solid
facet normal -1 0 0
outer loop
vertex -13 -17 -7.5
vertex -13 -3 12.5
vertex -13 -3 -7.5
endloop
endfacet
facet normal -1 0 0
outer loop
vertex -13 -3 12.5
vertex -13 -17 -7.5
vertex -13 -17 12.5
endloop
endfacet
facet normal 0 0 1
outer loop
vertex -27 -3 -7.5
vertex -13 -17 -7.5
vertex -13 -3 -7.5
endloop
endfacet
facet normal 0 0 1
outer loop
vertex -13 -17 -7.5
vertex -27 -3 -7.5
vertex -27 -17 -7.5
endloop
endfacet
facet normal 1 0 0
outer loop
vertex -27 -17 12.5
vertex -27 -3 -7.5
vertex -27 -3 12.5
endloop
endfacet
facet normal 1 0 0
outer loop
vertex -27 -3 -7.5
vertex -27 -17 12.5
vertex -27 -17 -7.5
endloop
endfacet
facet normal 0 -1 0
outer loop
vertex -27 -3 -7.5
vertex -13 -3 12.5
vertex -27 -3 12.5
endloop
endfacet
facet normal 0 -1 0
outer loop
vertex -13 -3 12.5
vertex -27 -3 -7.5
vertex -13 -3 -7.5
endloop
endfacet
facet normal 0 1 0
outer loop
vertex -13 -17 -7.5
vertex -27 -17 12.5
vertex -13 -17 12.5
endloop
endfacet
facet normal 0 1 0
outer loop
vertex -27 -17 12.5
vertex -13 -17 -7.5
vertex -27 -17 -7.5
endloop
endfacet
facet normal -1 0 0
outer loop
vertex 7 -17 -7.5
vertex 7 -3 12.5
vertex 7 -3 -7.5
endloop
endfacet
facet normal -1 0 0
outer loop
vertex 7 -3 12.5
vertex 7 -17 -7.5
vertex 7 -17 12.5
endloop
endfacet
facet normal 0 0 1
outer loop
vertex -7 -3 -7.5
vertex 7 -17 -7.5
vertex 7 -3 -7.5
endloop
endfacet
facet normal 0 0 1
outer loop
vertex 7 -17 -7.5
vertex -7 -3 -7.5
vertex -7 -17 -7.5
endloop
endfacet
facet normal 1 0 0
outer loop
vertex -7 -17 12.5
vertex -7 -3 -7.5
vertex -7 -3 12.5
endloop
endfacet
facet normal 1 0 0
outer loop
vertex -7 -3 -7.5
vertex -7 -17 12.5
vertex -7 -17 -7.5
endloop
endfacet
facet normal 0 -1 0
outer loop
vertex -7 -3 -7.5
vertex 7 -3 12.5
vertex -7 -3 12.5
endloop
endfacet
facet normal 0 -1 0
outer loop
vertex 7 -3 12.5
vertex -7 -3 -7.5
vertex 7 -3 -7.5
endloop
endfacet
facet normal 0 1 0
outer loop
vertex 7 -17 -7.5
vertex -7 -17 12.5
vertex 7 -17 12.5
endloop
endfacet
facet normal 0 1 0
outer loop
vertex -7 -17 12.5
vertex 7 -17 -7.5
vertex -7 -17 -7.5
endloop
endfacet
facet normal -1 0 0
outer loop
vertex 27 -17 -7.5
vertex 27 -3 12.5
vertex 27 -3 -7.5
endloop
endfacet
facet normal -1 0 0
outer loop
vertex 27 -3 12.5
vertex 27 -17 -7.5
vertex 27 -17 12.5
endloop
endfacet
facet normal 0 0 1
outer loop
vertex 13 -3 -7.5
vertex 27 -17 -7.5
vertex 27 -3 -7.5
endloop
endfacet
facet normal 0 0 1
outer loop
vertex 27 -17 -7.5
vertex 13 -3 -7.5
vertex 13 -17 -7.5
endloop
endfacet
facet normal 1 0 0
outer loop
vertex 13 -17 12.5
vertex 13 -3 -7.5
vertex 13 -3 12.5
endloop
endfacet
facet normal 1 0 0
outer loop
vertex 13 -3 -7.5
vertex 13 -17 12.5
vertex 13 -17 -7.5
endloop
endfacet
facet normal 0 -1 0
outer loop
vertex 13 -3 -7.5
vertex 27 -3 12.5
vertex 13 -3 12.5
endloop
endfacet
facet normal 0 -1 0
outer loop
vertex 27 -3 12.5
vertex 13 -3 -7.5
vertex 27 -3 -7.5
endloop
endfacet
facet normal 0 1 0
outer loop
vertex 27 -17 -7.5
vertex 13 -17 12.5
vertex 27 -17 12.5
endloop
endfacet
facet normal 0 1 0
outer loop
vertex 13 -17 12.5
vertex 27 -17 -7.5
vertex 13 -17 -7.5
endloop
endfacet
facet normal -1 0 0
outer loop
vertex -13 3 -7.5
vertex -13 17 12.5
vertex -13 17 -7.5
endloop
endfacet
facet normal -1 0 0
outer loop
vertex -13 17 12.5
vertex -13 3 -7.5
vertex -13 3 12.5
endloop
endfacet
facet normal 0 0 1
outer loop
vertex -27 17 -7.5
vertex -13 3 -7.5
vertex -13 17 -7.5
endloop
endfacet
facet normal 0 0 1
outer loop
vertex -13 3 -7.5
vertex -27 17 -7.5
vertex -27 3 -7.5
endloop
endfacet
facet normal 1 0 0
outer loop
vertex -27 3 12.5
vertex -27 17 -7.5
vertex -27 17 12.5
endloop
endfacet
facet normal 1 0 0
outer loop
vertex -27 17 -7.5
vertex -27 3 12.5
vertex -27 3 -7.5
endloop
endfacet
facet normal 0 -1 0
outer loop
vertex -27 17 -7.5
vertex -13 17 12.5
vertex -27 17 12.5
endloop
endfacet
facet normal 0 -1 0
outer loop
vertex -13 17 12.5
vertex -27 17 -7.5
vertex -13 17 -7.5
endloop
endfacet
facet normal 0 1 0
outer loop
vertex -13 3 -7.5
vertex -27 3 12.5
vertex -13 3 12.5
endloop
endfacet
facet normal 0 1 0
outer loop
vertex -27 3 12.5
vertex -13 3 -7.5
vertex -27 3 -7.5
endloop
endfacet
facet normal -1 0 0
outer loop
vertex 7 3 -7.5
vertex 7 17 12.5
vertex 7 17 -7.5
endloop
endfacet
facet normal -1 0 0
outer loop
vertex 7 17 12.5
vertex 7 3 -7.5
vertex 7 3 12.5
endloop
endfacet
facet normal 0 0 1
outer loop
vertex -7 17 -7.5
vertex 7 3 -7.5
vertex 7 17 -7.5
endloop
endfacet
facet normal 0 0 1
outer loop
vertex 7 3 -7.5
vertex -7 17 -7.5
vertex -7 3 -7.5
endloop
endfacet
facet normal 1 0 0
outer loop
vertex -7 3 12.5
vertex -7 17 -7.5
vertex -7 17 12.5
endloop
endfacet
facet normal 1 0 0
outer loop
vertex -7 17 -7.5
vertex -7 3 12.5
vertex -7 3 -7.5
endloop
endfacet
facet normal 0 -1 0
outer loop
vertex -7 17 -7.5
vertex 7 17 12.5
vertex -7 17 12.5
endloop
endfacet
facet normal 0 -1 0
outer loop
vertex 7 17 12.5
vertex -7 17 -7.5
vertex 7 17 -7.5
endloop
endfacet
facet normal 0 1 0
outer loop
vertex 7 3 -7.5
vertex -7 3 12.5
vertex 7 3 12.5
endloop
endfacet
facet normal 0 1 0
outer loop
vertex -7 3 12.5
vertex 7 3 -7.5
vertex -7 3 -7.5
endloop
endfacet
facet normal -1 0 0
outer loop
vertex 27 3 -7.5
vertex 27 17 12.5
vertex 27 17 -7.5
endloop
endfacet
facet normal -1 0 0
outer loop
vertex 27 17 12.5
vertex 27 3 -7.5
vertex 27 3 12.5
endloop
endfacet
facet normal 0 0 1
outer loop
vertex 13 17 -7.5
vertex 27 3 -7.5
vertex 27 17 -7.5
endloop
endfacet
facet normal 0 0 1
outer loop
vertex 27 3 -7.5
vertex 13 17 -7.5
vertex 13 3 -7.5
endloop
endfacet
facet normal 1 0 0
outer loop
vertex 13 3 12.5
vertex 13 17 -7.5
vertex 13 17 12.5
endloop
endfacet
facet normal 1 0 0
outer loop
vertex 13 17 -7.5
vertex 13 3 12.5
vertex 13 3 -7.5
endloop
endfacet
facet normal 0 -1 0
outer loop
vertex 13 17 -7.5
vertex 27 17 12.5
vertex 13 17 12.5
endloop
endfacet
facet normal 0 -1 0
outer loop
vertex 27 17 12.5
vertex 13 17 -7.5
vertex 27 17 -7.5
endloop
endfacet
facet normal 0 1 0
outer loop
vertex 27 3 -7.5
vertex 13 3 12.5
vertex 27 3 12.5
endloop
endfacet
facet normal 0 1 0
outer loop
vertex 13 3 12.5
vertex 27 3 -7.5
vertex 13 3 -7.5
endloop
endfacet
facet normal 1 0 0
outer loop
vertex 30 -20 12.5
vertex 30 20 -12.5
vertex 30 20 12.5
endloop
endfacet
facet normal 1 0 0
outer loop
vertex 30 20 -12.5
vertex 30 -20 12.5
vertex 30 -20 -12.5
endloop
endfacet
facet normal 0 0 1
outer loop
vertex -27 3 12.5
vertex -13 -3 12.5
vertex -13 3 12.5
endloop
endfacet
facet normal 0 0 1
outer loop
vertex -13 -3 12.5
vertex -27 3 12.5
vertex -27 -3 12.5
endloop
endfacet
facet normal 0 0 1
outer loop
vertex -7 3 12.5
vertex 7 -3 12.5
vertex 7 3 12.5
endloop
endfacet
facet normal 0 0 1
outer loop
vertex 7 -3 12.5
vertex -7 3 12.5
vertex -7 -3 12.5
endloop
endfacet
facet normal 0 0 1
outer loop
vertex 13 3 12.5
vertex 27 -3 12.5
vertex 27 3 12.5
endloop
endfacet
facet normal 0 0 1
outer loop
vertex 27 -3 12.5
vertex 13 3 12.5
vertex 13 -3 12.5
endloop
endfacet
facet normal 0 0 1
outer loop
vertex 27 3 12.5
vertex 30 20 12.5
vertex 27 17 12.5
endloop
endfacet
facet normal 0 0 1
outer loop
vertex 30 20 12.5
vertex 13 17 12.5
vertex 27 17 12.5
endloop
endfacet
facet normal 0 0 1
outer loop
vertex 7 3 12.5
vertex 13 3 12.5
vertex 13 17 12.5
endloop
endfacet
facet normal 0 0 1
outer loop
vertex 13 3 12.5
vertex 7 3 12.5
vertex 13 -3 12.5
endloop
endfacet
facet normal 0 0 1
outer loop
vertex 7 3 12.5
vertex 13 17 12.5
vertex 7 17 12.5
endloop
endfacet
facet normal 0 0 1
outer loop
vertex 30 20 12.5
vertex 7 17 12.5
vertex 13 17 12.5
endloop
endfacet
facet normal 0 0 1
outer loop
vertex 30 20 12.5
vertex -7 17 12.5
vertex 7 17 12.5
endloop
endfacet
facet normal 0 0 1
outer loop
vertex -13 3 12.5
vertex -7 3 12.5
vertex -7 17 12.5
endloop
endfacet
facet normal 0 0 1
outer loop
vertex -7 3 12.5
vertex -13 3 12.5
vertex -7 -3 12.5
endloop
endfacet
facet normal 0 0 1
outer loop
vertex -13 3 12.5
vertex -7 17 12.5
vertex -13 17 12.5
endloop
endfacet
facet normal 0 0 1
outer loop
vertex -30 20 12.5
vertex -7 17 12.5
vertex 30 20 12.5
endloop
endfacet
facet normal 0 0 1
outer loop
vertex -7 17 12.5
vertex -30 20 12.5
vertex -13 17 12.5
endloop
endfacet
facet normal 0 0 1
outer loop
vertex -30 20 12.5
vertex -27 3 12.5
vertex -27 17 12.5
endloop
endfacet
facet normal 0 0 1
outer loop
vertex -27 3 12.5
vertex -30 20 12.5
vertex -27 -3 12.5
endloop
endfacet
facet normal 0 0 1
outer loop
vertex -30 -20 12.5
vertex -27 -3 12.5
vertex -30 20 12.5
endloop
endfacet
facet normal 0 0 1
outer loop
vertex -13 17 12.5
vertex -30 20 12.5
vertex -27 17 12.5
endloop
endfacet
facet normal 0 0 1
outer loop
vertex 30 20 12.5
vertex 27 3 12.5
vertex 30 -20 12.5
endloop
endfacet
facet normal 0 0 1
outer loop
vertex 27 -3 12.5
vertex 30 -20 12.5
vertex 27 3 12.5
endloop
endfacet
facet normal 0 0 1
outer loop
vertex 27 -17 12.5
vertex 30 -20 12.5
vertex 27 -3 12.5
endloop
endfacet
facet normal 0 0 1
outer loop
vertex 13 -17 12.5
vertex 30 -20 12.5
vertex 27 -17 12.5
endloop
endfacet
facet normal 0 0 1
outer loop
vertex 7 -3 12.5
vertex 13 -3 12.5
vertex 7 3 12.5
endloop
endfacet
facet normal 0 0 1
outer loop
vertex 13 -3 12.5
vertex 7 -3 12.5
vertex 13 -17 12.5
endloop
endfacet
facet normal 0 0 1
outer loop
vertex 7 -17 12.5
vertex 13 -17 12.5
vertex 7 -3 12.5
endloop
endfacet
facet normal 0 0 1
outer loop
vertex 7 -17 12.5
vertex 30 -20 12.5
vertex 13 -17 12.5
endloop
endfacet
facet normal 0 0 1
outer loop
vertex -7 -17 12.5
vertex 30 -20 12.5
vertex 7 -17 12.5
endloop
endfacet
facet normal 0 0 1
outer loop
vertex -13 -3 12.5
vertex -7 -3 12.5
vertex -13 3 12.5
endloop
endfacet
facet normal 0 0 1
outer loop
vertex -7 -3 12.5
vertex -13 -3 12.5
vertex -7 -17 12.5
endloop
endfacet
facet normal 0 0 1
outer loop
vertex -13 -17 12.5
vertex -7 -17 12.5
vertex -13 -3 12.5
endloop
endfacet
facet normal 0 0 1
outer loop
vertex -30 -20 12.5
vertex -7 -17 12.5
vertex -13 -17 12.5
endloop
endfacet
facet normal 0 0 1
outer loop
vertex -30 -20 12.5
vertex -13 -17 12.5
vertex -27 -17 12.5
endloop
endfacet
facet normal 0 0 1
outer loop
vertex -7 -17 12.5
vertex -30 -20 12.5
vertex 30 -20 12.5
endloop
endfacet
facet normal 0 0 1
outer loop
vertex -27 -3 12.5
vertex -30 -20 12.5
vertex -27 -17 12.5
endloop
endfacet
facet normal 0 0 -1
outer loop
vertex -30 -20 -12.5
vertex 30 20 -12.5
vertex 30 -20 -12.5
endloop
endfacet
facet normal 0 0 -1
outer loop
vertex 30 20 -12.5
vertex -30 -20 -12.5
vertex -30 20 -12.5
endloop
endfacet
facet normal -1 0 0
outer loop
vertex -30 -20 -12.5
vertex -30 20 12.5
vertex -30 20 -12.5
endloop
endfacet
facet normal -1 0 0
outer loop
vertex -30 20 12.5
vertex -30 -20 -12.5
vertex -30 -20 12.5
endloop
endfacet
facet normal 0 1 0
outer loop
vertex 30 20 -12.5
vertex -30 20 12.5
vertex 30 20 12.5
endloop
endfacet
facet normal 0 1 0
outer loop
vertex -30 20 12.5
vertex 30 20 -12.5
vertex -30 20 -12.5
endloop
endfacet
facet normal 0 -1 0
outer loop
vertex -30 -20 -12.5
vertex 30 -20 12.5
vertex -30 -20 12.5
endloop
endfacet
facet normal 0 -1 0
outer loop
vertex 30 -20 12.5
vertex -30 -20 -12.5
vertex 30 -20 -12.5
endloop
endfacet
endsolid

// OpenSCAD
$fn = 32;

// ----------------------------------------------------------------------
// Pocket plate 60 x 40 x 25
// 2 x 3 pockets 14 mm square, 20 mm deep
// ----------------------------------------------------------------------

// --- parameters (mm) ---
thickness = 25;  // plate thickness
floor_t = 5;     // material left under each pocket
pocket = 14;     // pocket side length
pitch_x = 20;    // pocket pitch along X
pitch_y = 20;    // pocket pitch along Y
cols = 3;        // pockets per row
rows = 2;        // rows of pockets

// --- derived feature positions (mm) ---
depth = thickness - floor_t;        // = 20   pocket depth, down to the floor
span_x = (cols - 1) * pitch_x;      // = 40   distance between outer pockets
span_y = (rows - 1) * pitch_y;      // = 20   distance between outer pocket rows
origin_x = -span_x / 2;             // = -20   X of the first pocket
origin_y = -span_y / 2;             // = -10   Y of the first pocket
plate = [span_x + pocket + 6, span_y + pocket + 6, thickness];  // = [60, 40, 25]   overall size: pockets plus 3 mm of wall on each side
feature_centers = [
  [origin_x + 0 * pitch_x, origin_y + 0 * pitch_y],
  [origin_x + 1 * pitch_x, origin_y + 0 * pitch_y],
  [origin_x + 2 * pitch_x, origin_y + 0 * pitch_y],
  [origin_x + 0 * pitch_x, origin_y + 1 * pitch_y],
  [origin_x + 1 * pitch_x, origin_y + 1 * pitch_y],
  [origin_x + 2 * pitch_x, origin_y + 1 * pitch_y]
];   // pocket centres, used verbatim by the cutter loop

// plate outline, then one pocket per centre in feature_centers
difference() {
  cube(plate, center = true);
  for (centre = feature_centers)
    translate([centre[0] - pocket / 2, centre[1] - pocket / 2, plate[2] / 2 - depth])
      cube([pocket, pocket, depth + 1]);  // centred on the declared pocket centre
}
